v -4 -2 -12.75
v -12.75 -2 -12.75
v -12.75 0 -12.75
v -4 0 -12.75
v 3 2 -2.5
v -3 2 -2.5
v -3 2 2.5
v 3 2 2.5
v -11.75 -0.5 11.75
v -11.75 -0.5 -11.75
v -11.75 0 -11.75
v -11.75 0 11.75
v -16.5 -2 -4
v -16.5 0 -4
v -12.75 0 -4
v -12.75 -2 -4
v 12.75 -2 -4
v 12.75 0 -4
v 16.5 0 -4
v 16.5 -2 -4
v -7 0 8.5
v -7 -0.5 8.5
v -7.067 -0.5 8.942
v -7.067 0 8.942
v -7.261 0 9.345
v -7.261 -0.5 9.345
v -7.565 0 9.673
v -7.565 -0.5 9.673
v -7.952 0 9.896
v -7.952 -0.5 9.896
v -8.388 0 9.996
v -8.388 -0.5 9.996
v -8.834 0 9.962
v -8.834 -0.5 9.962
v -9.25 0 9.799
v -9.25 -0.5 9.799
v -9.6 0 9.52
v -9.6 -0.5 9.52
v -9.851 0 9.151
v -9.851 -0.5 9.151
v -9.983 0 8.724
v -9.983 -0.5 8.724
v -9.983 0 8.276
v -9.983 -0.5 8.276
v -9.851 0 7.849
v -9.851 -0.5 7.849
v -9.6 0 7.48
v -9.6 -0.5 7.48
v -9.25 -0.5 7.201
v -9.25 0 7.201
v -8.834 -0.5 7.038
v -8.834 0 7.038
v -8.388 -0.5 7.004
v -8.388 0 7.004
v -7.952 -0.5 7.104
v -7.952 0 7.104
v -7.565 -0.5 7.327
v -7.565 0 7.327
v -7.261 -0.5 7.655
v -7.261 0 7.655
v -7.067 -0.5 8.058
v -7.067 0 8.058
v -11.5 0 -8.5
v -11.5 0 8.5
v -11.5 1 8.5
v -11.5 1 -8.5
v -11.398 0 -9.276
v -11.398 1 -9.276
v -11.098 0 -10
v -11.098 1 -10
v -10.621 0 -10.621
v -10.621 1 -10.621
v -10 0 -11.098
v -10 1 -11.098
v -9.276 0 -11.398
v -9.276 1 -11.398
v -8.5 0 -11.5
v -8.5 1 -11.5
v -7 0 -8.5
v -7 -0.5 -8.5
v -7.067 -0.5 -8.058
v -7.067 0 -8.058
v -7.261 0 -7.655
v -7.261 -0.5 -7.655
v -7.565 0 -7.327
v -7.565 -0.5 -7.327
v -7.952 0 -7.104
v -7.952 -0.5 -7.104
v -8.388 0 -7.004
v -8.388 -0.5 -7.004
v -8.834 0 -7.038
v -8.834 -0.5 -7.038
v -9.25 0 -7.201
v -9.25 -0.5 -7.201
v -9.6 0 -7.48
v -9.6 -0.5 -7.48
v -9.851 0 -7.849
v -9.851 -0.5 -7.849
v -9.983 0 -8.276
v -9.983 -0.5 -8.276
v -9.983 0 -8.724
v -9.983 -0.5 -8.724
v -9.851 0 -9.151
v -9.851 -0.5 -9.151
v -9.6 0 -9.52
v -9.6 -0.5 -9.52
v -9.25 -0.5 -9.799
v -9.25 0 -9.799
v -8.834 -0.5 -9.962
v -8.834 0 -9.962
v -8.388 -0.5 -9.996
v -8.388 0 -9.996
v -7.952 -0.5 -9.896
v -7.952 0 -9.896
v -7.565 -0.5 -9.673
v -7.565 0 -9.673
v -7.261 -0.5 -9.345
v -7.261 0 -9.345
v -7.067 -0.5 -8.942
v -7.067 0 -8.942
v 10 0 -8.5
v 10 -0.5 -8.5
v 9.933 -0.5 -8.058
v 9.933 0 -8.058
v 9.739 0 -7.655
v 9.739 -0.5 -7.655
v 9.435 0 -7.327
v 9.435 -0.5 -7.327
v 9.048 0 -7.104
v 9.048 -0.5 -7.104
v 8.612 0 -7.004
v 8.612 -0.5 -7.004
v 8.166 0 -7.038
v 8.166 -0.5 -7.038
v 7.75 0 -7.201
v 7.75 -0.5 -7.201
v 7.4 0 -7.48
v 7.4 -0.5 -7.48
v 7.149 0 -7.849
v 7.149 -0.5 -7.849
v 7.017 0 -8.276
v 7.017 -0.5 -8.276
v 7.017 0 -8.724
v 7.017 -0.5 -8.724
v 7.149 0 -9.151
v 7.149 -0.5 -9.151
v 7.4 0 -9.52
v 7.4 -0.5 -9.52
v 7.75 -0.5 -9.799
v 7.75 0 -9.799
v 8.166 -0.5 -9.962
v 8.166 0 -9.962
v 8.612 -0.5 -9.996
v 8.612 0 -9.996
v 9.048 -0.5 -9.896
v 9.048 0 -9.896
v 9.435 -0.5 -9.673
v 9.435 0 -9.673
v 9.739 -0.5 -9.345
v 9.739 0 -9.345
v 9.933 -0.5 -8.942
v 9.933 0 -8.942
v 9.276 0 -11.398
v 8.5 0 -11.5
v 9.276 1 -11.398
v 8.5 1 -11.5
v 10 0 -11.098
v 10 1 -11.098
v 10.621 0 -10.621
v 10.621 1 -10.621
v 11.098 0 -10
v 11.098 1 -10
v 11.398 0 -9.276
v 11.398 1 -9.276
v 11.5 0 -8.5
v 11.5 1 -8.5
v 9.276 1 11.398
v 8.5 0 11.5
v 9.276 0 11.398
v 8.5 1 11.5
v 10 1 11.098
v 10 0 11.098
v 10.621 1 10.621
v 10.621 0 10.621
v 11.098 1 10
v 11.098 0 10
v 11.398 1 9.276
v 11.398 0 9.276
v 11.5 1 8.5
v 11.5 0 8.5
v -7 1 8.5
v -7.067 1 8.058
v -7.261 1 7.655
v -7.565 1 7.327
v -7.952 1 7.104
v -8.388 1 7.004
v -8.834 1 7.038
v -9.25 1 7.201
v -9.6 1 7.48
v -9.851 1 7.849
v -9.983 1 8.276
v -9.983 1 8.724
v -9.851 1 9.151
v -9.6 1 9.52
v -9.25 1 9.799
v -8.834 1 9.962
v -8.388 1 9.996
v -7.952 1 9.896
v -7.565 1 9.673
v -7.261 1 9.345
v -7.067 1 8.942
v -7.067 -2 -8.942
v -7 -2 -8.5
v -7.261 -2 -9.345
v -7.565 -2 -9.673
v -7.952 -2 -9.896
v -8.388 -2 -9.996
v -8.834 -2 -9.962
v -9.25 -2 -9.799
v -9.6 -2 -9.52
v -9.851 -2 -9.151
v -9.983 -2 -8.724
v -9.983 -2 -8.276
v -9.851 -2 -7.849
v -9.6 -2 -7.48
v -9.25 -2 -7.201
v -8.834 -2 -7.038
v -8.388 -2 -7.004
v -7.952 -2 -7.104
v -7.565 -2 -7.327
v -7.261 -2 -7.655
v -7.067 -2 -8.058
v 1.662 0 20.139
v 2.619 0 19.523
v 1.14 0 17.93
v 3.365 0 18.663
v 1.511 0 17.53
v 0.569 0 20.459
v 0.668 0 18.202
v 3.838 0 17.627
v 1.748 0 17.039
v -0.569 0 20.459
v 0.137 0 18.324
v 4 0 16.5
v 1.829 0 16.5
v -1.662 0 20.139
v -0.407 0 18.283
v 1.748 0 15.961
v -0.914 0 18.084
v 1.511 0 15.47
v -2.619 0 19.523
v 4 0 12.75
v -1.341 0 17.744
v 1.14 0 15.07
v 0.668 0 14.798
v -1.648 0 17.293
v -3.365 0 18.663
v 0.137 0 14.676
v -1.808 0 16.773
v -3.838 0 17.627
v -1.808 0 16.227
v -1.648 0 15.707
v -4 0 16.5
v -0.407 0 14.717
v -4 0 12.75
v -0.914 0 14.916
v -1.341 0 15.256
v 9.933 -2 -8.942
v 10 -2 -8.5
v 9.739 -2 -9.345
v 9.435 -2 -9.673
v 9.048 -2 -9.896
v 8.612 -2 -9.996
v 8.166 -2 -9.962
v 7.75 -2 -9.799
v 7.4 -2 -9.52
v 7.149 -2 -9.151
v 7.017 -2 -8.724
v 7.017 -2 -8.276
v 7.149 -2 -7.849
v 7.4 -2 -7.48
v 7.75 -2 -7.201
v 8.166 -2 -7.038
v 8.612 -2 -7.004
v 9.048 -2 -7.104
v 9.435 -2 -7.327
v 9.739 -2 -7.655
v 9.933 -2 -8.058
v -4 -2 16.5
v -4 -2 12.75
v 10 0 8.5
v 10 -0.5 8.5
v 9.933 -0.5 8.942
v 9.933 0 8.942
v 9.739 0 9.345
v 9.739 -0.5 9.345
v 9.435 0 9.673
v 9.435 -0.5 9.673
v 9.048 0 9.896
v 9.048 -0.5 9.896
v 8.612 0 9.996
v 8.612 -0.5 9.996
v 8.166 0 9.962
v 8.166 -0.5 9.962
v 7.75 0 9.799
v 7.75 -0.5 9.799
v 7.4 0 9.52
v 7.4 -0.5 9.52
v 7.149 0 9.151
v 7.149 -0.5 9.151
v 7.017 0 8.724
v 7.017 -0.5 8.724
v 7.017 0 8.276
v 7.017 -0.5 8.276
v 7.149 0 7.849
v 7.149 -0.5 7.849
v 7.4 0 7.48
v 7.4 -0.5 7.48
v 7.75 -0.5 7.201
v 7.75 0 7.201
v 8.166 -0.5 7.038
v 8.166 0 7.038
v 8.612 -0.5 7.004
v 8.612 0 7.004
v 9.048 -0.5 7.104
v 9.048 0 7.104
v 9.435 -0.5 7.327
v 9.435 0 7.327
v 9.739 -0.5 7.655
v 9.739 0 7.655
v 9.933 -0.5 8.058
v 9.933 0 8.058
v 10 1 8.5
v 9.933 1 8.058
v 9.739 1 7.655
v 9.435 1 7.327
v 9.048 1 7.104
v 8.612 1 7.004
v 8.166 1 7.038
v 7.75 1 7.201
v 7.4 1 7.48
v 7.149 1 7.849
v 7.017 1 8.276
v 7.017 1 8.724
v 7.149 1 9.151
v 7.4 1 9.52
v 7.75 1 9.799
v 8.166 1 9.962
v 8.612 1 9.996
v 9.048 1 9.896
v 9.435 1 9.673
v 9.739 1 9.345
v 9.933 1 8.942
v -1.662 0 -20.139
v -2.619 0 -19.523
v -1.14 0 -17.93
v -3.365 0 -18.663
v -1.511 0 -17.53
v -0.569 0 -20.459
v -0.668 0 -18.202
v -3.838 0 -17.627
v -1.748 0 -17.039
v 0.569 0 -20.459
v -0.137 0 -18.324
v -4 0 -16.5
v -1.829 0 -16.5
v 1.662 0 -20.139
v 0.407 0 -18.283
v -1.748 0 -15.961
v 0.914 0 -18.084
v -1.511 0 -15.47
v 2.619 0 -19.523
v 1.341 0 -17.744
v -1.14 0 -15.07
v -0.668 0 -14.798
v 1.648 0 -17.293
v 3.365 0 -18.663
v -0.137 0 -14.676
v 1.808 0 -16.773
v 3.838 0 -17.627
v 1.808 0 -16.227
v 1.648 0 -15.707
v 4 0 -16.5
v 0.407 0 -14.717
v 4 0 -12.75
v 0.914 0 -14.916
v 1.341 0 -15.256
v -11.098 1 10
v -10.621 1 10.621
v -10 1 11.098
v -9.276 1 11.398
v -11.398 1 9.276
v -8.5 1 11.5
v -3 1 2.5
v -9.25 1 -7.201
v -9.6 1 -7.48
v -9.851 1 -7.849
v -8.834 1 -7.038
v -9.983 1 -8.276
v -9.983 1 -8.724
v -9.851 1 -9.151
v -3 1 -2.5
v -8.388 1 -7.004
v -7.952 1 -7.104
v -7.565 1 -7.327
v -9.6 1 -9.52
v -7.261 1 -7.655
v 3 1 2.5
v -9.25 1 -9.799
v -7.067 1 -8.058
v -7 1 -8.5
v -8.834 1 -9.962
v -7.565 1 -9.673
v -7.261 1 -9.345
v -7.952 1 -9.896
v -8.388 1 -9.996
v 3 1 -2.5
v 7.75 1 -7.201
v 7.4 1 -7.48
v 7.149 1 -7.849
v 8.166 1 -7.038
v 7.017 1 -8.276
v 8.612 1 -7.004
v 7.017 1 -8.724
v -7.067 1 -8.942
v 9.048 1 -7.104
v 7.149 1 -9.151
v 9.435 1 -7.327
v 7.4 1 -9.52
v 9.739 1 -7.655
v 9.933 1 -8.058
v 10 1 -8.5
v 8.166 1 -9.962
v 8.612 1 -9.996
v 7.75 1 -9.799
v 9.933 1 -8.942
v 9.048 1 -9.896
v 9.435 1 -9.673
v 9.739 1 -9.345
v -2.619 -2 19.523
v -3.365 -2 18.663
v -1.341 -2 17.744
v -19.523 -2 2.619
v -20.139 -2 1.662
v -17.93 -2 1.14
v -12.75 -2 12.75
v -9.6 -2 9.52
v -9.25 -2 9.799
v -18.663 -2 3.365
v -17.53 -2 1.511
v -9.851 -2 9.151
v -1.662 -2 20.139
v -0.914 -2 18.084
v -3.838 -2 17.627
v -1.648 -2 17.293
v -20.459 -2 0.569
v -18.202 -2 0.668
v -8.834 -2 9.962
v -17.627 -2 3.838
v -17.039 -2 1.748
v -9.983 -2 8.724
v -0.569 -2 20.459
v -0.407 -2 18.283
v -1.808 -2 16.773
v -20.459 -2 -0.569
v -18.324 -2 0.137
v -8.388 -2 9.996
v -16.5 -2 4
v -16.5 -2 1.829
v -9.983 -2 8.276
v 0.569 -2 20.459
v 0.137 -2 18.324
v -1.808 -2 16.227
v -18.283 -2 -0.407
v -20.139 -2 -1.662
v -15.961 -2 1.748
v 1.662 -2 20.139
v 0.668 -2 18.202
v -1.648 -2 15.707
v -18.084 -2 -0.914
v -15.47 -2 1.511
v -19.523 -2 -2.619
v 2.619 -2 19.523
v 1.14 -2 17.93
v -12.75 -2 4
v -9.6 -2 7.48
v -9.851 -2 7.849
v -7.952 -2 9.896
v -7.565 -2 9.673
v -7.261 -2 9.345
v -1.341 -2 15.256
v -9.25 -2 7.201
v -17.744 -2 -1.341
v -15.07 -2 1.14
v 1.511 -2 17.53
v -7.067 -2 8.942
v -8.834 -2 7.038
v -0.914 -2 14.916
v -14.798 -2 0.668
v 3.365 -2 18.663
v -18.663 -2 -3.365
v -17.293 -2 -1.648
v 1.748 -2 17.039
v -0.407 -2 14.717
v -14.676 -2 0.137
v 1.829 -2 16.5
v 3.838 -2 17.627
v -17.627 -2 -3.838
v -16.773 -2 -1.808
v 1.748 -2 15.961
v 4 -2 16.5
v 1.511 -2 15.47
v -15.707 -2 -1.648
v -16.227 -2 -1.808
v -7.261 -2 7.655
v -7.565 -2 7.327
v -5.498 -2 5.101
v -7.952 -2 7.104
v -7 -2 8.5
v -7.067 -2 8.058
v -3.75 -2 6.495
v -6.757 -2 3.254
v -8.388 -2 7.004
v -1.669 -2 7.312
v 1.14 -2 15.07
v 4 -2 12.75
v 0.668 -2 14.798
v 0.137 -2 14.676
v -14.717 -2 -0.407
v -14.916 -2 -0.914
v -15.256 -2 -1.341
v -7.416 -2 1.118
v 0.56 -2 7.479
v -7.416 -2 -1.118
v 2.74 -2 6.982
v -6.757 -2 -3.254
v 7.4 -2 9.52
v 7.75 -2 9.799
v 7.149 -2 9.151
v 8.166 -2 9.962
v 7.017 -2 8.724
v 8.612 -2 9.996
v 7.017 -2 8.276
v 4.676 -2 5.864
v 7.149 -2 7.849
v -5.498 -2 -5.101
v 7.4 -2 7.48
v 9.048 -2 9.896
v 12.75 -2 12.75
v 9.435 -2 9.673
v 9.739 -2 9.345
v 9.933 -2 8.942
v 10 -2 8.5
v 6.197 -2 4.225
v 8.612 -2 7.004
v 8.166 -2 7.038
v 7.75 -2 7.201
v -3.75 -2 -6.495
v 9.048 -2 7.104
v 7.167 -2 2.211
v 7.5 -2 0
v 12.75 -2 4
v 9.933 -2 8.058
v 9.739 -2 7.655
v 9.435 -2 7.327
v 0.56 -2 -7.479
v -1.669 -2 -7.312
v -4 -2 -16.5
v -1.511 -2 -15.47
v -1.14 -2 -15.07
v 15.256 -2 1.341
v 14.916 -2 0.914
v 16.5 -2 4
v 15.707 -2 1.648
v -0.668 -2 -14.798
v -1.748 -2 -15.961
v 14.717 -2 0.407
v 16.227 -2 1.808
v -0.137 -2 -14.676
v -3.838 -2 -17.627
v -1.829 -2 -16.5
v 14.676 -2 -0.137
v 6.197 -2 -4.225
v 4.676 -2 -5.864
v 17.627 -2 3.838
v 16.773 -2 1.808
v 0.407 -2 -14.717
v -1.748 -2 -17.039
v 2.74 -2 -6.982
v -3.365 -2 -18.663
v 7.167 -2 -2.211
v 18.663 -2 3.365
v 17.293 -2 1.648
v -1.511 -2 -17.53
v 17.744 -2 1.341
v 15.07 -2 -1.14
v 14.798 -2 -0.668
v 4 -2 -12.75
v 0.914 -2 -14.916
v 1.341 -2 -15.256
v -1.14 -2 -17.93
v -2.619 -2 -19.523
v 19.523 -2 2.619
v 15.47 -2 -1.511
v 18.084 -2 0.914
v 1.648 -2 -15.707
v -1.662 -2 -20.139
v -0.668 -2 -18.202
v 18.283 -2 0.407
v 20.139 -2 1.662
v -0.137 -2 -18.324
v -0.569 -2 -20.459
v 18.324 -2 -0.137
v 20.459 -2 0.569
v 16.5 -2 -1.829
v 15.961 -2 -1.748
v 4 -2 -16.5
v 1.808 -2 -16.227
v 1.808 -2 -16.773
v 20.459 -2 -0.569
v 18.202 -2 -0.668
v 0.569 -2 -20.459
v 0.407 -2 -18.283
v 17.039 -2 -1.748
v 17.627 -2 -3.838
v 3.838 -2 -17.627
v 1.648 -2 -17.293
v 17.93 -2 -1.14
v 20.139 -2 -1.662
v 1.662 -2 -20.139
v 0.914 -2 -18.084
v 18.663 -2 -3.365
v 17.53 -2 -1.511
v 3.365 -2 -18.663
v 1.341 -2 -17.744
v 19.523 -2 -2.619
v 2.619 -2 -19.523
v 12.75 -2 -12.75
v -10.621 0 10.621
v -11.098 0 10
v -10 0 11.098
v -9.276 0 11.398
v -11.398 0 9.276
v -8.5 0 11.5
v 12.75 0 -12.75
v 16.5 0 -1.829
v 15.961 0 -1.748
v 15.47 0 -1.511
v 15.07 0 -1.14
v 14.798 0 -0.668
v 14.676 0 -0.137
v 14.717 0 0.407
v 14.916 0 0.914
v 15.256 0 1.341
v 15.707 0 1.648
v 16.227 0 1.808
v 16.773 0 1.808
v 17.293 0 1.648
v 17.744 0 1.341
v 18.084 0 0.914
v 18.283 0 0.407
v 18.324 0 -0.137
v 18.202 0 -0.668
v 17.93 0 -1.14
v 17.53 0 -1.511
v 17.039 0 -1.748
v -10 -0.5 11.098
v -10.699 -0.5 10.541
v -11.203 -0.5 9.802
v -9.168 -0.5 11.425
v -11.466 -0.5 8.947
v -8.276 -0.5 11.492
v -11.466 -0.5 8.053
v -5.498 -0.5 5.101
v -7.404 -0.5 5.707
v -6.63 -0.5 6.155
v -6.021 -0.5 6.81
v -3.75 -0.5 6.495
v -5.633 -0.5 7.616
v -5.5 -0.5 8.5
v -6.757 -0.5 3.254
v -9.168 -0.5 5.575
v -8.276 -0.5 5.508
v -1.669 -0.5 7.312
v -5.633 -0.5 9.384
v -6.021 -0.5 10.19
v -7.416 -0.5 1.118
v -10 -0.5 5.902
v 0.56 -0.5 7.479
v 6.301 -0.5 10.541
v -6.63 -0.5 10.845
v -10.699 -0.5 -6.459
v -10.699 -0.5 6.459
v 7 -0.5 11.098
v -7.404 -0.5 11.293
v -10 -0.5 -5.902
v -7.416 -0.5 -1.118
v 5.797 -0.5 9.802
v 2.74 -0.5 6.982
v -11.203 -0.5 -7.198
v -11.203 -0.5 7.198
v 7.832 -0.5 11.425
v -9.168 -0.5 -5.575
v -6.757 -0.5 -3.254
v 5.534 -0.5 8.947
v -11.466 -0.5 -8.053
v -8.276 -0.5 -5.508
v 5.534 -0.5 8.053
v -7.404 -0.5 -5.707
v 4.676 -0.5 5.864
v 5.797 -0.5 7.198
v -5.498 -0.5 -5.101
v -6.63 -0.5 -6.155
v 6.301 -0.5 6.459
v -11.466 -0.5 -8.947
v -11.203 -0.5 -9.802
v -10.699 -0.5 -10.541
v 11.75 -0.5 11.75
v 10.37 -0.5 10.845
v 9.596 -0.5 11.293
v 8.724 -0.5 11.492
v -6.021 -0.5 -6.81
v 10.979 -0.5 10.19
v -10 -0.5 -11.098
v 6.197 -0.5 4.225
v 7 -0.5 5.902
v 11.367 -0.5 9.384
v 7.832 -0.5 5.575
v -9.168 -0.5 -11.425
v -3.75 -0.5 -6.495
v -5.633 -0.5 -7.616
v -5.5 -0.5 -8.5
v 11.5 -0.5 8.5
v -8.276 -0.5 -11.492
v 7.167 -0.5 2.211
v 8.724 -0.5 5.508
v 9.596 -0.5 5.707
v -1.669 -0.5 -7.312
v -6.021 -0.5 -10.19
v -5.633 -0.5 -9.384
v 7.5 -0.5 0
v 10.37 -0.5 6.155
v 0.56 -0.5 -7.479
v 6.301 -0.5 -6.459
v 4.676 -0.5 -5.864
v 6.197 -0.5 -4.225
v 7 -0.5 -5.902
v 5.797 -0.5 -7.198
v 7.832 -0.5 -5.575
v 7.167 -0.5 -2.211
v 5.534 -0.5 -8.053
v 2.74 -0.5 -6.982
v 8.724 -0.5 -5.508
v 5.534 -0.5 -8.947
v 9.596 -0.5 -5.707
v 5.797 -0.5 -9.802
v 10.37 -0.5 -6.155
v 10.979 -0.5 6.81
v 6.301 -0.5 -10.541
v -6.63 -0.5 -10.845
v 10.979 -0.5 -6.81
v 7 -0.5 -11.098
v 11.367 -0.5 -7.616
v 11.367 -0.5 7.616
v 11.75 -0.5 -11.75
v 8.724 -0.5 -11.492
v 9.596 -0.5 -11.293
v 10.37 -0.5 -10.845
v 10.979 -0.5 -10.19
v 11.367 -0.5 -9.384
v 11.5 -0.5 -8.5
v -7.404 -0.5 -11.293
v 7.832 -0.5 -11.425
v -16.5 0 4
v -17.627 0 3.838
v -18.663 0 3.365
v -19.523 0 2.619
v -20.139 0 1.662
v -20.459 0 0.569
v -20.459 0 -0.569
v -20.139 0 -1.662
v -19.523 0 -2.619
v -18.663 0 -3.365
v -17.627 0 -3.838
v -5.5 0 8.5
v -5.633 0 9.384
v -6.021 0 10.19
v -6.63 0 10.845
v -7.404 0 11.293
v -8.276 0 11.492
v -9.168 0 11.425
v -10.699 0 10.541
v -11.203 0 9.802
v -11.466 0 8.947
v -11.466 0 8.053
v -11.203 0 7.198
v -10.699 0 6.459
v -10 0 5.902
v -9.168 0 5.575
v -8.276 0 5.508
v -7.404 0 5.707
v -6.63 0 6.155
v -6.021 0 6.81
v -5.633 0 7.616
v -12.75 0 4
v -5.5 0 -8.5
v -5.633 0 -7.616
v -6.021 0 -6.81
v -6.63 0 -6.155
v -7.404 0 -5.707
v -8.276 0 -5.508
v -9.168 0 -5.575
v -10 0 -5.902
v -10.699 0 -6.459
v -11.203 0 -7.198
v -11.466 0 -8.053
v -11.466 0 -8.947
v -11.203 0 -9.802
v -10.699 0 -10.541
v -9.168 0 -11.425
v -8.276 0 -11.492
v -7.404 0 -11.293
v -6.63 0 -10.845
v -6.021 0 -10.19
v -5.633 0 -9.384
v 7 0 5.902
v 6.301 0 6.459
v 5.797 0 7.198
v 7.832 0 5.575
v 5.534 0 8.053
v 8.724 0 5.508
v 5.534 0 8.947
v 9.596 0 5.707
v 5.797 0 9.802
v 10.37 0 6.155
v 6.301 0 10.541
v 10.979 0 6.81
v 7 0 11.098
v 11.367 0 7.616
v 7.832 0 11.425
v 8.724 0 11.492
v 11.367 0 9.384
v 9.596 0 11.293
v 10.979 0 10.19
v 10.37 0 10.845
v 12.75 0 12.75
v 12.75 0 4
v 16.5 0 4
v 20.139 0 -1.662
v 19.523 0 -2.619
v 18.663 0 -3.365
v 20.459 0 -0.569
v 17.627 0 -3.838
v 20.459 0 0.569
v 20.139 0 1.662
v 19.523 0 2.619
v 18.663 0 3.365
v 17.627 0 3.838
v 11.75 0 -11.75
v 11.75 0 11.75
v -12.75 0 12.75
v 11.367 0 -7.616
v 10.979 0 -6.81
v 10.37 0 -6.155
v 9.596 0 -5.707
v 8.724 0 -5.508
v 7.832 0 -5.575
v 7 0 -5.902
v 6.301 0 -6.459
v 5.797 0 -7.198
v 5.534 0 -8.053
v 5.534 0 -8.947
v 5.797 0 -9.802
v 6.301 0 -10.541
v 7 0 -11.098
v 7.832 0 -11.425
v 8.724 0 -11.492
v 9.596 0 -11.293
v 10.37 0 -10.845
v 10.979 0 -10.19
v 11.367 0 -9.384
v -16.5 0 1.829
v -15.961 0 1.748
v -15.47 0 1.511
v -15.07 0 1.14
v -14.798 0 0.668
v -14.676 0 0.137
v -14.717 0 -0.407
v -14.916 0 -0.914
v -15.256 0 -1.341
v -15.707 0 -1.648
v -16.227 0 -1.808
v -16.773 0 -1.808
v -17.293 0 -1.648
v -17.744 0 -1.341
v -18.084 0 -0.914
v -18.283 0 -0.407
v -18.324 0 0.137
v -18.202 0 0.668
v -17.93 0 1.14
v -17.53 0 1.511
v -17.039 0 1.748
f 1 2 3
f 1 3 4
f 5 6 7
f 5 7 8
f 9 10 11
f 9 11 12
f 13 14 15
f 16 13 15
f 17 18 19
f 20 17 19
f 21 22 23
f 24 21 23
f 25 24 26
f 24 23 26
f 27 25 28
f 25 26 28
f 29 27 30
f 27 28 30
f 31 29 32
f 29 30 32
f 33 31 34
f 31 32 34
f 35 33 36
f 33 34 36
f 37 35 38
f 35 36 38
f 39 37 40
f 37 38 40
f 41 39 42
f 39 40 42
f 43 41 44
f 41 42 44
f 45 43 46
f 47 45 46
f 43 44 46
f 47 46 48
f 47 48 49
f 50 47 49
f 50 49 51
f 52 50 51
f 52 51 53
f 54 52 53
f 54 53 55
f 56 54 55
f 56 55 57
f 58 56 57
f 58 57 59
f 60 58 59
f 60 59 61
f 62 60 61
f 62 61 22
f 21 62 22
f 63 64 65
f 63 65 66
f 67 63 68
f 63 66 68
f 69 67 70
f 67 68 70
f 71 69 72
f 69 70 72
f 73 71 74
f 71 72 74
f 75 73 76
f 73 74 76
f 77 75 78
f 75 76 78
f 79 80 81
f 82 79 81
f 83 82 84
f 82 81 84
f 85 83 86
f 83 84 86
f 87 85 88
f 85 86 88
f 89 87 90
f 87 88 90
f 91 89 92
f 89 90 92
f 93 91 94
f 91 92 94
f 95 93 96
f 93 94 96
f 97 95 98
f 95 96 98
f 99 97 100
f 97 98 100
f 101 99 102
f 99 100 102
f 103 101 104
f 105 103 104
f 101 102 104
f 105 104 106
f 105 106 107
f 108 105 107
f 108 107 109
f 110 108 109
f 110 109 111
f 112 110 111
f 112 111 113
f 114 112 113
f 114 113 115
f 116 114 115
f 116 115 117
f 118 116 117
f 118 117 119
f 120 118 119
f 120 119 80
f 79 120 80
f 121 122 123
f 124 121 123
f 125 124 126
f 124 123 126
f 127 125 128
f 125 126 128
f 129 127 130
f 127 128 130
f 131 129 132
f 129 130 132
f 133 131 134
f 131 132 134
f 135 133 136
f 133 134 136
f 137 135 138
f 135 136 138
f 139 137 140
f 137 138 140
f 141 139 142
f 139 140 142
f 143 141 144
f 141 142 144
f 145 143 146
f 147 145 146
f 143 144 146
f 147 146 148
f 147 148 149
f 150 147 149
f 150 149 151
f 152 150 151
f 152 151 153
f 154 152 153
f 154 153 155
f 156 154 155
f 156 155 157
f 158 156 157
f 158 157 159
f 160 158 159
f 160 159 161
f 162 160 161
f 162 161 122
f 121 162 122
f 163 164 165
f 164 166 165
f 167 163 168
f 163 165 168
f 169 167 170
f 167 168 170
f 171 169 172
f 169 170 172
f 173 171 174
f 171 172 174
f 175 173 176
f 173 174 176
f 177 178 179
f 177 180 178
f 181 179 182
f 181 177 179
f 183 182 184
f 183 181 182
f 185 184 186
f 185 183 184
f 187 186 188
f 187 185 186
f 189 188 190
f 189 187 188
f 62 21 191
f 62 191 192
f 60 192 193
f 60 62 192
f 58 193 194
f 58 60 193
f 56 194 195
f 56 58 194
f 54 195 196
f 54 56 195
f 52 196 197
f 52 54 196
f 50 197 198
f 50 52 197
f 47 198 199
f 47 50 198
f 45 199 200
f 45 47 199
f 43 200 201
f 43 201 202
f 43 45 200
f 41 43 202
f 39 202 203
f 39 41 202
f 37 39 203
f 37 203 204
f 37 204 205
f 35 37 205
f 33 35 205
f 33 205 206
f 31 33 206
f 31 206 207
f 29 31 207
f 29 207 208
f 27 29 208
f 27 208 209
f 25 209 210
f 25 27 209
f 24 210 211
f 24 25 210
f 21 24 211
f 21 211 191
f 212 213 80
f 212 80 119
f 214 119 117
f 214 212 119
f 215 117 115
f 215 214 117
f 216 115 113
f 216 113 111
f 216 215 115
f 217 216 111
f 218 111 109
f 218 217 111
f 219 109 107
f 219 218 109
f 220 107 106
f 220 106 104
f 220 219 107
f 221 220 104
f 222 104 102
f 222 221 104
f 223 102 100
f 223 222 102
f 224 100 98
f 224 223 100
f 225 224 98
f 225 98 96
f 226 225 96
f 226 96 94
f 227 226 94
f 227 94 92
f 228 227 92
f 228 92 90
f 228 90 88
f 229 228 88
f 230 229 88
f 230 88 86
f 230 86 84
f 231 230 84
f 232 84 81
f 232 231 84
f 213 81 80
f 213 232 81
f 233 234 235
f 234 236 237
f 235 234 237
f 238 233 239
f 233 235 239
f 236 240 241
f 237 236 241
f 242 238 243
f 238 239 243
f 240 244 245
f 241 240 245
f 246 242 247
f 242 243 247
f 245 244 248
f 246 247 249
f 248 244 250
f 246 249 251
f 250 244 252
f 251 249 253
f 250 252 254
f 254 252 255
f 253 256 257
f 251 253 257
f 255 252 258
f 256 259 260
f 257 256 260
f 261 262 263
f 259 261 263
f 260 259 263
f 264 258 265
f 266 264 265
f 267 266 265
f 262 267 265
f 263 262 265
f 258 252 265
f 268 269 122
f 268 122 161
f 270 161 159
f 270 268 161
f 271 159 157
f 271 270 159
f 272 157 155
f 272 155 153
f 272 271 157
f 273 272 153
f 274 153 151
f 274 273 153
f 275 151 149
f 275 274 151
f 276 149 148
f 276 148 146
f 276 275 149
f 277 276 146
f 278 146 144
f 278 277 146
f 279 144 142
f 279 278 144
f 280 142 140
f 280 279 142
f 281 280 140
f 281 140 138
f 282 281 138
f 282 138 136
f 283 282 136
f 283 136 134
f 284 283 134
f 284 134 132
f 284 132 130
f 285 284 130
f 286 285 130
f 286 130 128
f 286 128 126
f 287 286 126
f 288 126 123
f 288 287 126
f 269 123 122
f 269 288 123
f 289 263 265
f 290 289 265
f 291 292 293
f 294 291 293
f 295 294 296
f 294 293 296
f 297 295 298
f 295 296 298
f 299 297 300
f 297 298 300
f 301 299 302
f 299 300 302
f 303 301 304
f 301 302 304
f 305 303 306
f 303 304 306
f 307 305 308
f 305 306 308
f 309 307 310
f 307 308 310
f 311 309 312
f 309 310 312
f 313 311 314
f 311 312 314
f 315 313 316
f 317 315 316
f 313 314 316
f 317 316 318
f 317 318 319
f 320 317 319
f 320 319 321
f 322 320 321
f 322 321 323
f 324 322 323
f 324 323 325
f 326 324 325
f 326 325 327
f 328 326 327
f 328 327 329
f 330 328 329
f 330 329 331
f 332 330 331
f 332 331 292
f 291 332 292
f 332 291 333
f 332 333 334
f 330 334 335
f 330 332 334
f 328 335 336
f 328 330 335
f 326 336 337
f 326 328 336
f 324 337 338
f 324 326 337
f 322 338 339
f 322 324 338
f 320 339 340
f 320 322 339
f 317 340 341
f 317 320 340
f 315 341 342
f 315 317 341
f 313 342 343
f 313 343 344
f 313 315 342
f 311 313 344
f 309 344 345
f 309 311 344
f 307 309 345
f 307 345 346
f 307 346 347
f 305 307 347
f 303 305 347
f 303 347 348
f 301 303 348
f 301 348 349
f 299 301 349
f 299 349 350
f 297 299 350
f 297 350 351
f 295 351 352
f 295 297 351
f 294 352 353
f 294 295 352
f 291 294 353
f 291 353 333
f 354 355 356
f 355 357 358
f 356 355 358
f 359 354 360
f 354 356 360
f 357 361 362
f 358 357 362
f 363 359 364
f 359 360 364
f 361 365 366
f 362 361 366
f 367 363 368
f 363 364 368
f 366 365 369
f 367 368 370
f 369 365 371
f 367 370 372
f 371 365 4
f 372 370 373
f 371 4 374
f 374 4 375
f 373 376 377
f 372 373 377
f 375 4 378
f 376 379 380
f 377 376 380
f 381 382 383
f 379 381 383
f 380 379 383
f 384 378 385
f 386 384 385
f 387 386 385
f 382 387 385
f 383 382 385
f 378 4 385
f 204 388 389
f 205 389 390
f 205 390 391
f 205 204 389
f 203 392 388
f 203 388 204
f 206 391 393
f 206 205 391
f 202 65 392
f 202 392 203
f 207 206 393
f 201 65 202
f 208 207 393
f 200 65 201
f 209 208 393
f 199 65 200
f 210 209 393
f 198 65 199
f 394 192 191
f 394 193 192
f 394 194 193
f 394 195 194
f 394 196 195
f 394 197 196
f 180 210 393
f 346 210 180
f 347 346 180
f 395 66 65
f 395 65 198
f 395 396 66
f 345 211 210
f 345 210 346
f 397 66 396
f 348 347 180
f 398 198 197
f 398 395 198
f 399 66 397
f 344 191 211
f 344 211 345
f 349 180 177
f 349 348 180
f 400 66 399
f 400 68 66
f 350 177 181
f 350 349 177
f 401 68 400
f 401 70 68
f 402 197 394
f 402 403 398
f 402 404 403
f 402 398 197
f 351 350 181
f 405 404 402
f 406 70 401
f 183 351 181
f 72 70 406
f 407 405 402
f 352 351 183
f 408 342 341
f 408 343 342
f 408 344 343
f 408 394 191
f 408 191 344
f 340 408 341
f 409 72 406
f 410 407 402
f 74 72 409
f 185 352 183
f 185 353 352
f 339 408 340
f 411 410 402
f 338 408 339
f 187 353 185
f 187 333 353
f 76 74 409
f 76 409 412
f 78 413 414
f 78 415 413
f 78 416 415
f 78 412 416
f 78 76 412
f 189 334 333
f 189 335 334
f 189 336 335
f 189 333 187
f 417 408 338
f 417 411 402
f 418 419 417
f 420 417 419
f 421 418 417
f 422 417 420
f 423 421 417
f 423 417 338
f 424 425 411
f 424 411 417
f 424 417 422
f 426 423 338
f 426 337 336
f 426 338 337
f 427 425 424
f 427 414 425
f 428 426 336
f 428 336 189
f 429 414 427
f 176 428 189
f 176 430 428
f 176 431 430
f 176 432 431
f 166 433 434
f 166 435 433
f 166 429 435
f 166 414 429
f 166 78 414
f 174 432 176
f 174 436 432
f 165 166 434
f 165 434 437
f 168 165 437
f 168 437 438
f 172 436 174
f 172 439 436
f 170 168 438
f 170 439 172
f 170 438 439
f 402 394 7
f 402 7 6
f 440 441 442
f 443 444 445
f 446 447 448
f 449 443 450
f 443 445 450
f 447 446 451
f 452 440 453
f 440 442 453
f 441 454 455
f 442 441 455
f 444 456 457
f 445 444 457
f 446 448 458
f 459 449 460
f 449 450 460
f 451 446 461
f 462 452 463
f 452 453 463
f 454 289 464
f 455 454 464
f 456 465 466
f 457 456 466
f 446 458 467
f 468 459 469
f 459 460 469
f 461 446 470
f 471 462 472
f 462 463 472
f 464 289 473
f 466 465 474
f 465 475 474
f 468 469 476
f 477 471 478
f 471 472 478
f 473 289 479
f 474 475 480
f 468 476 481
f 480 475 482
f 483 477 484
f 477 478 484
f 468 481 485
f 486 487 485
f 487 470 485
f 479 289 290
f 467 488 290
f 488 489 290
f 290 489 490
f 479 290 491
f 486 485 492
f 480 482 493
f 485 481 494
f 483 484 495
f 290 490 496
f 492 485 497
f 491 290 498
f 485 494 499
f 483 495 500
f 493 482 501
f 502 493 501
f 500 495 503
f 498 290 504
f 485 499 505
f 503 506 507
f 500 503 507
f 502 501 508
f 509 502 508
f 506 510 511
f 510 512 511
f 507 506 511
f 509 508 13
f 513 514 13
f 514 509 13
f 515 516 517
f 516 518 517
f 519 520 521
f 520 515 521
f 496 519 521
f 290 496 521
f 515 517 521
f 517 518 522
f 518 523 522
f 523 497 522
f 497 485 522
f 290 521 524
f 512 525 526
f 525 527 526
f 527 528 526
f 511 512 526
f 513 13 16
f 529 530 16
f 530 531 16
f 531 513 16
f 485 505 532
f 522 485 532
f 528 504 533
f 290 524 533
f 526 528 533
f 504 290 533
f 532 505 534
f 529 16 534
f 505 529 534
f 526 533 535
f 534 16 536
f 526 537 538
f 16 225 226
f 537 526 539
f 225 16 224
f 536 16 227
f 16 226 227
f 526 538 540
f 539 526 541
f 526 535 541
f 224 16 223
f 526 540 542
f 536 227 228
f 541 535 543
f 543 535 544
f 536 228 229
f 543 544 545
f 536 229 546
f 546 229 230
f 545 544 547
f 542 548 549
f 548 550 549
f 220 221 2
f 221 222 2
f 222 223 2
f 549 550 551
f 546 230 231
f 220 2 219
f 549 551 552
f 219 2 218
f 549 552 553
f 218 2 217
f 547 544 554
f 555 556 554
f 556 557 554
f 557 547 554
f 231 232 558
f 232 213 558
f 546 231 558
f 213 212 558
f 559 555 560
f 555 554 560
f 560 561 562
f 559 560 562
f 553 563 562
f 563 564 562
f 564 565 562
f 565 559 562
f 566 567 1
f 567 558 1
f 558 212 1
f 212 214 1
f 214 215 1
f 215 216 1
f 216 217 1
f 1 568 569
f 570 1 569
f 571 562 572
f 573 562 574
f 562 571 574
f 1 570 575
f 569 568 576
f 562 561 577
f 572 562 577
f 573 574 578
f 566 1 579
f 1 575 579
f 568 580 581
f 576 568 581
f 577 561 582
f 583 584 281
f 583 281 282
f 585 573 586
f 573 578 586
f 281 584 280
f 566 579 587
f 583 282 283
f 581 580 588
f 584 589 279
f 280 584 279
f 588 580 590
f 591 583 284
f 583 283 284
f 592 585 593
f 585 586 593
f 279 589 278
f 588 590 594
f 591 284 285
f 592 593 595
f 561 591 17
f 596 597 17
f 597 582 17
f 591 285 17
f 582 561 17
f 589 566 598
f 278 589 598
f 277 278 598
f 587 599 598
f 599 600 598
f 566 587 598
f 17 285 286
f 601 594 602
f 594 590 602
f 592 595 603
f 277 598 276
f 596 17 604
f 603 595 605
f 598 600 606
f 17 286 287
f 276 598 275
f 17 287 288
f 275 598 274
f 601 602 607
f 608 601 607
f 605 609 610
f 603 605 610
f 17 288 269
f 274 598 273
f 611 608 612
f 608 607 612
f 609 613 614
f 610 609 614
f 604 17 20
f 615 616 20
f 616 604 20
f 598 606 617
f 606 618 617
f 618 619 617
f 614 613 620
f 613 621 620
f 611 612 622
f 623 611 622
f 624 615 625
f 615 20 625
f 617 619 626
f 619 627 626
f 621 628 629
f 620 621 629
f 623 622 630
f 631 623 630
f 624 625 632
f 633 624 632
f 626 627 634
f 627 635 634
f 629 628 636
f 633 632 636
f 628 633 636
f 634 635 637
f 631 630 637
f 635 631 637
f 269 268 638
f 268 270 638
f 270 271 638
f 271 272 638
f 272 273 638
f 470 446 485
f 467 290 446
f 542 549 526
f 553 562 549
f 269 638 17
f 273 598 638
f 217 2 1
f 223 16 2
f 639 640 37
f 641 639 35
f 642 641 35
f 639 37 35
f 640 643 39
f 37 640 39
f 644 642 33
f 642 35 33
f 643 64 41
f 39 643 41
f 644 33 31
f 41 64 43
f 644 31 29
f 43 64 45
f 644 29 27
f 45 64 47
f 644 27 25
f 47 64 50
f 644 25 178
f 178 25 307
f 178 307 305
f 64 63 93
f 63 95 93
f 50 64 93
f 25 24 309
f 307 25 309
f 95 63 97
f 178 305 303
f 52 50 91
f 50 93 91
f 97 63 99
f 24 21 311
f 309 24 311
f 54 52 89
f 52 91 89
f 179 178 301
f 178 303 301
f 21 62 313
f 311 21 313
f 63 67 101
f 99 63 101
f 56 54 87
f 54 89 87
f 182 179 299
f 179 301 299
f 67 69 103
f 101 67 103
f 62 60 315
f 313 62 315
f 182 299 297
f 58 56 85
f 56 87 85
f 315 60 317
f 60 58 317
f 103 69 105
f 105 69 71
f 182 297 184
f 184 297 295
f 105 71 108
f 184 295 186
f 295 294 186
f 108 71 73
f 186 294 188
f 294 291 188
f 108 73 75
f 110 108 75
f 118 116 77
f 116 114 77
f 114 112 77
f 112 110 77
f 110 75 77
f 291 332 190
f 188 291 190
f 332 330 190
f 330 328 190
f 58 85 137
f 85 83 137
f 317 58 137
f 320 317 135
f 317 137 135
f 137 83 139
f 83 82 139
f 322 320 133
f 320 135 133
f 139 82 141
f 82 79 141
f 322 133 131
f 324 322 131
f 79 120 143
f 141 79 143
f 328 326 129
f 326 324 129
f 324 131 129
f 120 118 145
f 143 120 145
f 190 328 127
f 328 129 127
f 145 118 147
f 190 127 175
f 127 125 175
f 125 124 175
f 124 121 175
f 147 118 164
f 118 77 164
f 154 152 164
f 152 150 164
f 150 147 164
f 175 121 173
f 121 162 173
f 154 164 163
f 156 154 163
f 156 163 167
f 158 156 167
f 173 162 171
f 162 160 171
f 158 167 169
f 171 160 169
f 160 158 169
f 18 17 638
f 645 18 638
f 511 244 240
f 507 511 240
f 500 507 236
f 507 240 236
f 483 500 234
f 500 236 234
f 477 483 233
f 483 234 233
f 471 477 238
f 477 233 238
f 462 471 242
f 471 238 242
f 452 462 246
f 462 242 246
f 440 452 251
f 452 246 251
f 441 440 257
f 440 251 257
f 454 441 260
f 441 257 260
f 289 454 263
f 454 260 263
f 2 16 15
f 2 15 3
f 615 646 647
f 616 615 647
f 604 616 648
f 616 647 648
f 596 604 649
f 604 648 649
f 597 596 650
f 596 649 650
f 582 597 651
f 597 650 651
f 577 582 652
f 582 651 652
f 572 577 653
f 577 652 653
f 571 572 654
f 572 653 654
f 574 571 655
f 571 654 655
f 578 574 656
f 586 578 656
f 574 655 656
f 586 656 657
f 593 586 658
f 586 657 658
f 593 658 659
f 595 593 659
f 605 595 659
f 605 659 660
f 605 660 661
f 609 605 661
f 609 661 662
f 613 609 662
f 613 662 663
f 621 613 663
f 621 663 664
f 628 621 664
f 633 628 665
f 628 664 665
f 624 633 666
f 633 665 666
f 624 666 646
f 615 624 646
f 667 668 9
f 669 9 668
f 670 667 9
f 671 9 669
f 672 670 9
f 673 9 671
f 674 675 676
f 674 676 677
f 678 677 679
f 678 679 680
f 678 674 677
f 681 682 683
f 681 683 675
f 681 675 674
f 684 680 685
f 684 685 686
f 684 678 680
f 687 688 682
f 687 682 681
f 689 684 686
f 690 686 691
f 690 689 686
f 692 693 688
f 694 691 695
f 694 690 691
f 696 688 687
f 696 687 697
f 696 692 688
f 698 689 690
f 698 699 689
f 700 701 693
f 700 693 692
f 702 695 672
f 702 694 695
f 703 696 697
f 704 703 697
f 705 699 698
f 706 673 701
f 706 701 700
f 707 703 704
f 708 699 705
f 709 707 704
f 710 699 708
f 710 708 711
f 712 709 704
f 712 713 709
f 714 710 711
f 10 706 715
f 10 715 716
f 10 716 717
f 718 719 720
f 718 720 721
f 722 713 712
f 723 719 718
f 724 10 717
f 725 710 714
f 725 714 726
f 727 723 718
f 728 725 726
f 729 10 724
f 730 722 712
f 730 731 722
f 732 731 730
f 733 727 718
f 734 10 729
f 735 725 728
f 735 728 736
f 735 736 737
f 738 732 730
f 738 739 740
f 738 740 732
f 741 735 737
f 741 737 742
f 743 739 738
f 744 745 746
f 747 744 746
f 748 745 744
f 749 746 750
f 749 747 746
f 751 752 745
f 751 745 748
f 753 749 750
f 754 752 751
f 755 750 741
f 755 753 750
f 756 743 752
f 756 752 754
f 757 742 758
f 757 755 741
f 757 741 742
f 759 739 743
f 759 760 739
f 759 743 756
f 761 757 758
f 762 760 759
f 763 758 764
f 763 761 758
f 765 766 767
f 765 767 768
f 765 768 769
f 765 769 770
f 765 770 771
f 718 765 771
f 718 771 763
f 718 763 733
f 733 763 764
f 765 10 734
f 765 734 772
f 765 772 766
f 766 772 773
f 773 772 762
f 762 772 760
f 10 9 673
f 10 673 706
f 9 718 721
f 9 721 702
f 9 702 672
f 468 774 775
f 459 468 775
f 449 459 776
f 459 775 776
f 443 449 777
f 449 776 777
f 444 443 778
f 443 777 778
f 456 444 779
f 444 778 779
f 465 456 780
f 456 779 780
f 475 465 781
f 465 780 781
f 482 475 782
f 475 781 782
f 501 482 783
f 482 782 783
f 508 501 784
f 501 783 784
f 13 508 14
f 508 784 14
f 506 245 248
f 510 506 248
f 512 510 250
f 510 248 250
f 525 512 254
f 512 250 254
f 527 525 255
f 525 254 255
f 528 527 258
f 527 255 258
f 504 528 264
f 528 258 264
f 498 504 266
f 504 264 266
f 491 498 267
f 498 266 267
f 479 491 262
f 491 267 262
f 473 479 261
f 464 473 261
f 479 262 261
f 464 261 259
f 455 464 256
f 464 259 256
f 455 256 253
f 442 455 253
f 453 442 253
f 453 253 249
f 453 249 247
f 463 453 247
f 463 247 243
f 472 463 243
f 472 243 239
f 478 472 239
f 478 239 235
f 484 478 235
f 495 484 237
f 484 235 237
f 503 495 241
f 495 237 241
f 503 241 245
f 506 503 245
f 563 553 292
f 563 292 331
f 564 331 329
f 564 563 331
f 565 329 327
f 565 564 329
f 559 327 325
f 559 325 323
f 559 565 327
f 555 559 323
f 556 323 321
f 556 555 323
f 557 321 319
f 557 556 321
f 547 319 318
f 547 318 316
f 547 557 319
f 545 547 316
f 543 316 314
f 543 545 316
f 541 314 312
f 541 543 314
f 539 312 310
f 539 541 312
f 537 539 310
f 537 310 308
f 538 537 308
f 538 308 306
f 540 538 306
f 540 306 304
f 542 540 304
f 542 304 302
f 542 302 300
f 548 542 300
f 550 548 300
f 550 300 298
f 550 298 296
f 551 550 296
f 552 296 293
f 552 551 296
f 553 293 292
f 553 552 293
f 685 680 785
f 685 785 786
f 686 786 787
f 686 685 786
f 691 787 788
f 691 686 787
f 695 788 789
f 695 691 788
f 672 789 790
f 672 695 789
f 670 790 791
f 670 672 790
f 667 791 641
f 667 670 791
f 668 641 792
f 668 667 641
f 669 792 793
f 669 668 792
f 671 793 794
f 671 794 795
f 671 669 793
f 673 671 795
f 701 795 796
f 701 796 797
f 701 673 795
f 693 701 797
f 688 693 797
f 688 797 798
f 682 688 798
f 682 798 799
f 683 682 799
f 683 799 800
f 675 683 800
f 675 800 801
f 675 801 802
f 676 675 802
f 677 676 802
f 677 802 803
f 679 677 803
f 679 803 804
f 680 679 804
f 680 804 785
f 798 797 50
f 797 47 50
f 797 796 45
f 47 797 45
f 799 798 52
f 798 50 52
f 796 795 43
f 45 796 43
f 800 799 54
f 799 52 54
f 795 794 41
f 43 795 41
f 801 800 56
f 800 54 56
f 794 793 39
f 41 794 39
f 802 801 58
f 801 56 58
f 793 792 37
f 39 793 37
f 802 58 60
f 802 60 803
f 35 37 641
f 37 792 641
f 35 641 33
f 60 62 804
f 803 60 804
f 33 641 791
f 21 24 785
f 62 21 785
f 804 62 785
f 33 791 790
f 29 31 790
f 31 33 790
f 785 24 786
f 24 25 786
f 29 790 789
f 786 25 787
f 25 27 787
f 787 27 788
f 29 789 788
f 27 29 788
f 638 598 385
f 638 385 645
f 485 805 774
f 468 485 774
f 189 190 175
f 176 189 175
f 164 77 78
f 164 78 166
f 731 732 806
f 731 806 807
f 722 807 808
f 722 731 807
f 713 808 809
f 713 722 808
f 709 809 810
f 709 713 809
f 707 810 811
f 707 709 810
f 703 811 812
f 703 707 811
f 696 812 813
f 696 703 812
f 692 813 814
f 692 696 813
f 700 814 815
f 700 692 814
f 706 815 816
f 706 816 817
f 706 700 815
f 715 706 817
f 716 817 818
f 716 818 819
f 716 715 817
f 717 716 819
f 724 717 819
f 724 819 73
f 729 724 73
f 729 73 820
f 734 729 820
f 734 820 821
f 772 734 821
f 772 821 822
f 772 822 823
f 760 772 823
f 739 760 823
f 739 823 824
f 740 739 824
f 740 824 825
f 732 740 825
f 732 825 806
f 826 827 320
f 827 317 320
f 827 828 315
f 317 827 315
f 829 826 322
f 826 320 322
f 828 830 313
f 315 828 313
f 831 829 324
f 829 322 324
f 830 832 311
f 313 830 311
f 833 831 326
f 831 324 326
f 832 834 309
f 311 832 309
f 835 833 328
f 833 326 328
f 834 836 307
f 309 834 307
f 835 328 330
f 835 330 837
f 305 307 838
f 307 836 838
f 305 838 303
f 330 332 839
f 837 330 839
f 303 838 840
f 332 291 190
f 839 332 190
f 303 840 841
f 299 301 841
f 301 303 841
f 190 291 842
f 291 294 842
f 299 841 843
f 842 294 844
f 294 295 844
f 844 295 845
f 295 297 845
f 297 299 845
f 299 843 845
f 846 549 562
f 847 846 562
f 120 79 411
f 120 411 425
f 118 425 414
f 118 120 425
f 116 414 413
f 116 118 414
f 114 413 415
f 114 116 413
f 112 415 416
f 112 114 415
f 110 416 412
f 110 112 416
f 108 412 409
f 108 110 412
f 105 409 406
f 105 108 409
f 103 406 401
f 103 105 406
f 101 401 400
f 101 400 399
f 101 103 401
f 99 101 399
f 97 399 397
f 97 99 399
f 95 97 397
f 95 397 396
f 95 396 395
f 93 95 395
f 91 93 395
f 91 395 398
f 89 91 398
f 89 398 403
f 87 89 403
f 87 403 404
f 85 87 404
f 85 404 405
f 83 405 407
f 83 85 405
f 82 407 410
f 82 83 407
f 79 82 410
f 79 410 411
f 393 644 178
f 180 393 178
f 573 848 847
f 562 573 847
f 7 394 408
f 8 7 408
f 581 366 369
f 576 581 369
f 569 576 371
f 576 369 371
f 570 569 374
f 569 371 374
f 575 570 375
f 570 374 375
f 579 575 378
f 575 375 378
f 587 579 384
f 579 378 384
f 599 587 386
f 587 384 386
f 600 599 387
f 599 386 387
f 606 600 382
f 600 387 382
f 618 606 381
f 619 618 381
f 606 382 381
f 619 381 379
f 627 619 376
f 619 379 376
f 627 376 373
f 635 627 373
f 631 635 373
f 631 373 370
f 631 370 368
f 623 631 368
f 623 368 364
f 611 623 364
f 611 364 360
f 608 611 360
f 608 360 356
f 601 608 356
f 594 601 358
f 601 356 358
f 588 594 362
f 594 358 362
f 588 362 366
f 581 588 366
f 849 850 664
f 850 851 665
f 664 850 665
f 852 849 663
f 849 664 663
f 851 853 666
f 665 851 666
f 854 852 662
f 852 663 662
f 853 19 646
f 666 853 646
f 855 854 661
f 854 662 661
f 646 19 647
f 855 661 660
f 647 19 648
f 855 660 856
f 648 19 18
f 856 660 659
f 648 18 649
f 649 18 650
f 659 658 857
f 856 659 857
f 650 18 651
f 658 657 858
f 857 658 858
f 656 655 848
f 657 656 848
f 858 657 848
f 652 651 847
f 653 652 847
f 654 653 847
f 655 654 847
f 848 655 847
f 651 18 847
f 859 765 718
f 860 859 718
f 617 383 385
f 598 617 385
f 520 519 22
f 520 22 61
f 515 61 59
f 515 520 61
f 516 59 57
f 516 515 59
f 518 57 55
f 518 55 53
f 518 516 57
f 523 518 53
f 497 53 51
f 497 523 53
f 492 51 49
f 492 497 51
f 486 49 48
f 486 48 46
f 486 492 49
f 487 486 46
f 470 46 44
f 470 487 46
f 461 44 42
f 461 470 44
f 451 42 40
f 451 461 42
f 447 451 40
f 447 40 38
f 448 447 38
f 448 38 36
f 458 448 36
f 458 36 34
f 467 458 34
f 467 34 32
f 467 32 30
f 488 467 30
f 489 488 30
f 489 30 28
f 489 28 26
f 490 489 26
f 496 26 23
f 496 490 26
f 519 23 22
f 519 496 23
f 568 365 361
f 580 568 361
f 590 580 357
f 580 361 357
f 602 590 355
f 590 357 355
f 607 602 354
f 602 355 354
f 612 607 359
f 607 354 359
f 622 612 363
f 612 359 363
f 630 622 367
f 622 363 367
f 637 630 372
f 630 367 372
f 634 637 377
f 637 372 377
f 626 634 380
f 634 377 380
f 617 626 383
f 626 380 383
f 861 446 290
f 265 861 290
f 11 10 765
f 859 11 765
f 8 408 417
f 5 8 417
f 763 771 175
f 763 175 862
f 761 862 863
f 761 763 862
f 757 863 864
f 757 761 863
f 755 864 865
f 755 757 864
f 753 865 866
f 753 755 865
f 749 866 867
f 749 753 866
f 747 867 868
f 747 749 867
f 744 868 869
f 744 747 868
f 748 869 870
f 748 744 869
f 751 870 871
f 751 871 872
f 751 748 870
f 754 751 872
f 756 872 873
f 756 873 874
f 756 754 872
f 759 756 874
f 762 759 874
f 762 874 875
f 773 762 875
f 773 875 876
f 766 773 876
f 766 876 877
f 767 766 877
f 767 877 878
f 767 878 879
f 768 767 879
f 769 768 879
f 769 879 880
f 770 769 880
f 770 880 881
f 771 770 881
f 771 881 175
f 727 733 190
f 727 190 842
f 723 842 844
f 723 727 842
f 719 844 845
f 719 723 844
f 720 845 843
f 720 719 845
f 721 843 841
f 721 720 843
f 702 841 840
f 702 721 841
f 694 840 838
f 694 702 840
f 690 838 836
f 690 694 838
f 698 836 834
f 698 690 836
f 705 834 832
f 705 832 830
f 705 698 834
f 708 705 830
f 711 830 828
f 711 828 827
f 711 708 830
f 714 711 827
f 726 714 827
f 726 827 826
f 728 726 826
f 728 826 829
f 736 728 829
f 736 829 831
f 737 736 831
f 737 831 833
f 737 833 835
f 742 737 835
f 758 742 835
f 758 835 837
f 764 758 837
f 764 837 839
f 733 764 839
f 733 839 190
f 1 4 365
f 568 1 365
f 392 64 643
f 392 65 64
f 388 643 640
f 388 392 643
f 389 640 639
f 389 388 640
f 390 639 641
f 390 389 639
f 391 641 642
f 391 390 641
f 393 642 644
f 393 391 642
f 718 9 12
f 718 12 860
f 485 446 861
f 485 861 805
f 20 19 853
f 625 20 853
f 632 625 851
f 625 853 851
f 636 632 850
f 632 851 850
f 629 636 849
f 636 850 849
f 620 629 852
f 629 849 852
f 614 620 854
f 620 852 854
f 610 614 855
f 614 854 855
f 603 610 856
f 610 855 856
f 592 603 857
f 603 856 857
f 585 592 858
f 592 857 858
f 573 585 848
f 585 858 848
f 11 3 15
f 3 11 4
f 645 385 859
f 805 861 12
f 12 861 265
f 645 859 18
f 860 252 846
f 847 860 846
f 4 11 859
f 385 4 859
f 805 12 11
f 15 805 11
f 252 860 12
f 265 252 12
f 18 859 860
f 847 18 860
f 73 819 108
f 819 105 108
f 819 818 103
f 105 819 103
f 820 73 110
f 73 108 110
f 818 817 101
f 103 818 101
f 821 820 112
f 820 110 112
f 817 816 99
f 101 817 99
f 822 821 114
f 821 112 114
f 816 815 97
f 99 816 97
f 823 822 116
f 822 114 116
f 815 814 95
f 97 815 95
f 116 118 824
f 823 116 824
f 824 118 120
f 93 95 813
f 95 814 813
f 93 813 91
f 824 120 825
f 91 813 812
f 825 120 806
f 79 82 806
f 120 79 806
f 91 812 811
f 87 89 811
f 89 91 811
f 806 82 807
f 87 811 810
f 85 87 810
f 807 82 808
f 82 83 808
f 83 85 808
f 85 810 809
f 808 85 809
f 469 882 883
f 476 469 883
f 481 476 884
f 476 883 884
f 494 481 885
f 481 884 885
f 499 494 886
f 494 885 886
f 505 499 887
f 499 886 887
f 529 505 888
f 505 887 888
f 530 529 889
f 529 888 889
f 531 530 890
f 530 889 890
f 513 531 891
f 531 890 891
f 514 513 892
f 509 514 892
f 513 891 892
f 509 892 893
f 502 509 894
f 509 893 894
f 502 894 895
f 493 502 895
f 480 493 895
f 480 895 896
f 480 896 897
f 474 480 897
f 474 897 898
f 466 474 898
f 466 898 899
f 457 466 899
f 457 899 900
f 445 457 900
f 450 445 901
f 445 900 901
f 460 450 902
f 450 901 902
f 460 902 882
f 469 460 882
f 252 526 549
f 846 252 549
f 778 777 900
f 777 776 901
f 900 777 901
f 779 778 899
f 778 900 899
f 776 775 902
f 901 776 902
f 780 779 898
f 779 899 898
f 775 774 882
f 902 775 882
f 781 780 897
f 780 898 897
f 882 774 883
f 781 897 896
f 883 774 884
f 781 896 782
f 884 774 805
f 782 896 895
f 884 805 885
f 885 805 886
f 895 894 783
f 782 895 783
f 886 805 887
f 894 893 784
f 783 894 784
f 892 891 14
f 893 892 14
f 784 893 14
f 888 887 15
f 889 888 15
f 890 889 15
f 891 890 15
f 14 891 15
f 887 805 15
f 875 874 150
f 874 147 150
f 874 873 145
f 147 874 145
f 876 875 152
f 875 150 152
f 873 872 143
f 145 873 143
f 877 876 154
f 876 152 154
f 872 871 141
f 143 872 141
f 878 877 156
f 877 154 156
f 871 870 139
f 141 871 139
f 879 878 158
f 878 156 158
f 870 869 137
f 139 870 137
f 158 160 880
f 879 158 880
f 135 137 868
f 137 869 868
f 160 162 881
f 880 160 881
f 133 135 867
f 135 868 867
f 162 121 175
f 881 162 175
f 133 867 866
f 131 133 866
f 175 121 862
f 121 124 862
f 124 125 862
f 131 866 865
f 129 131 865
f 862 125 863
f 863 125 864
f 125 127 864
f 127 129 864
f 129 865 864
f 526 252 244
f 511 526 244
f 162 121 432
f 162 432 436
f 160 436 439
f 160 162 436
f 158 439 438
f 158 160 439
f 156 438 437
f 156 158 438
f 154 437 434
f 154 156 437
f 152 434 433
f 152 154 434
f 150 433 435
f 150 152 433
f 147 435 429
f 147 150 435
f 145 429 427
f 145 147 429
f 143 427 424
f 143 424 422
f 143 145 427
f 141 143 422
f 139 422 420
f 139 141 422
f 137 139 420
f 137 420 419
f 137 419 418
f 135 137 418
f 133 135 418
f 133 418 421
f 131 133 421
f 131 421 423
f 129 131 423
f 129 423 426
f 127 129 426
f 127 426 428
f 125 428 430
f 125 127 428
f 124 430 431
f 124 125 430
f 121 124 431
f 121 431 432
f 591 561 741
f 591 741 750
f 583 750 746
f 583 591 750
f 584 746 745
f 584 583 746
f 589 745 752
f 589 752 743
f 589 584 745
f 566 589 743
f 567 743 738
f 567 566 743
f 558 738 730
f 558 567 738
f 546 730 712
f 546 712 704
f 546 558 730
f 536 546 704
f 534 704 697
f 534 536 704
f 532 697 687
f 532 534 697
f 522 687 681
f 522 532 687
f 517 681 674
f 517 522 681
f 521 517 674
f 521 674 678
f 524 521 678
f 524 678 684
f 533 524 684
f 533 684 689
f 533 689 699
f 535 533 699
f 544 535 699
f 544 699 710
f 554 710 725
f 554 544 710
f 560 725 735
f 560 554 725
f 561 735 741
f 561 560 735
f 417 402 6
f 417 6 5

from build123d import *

# Parameters (mm, degrees)
SKETCH1_W           = 23
SKETCH1_H           = 23
SKETCH1_R           = 1.5
BOSS_EXTRUDE1_DEPTH = 1
SKETCH2_W           = 6
SKETCH2_H           = 5
BOSS_EXTRUDE2_DEPTH = 1
FILLET1_R           = 3
BOSS_EXTRUDE3_START = -3
SKETCH3_W           = 25.5
SKETCH3_H           = 25.5
SKETCH3_R           = 1.5
SKETCH3_R_2         = 7.5
BOSS_EXTRUDE3_DEPTH = 1.5
SKETCH4_R           = 3
SKETCH4_R_2         = 1.5
BOSS_EXTRUDE4_DEPTH = 2
SKETCH5_W           = 25.5
SKETCH5_H           = 25.5
SKETCH5_W_2         = 23.5
SKETCH5_H_2         = 23.5
BOSS_EXTRUDE5_DEPTH = 2
SKETCH6_R           = 1.8288
BOSS_EXTRUDE6_DEPTH = 2
CIRPATTERN1_COUNT   = 4


with BuildPart() as part:
    # Sketch1 → Boss-Extrude1 (new body)
    with BuildSketch(Plane(origin=(0, 0, 0), x_dir=(1, 0, 0), z_dir=(0, 1, 0))):
        Rectangle(SKETCH1_W, SKETCH1_H)
        with Locations((-8.5, 8.5)):
            Circle(SKETCH1_R, mode=Mode.SUBTRACT)
        with Locations((8.5, 8.5)):
            Circle(SKETCH1_R, mode=Mode.SUBTRACT)
        with Locations((8.5, -8.5)):
            Circle(SKETCH1_R, mode=Mode.SUBTRACT)
        with Locations((-8.5, -8.5)):
            Circle(SKETCH1_R, mode=Mode.SUBTRACT)
    extrude(amount=BOSS_EXTRUDE1_DEPTH)

    # Sketch2 → Boss-Extrude2 (add)
    with BuildSketch(Plane(origin=(0, 1, 0), x_dir=(1, 0, 0), z_dir=(0, 1, 0))):
        Rectangle(SKETCH2_W, SKETCH2_H)
    extrude(amount=BOSS_EXTRUDE2_DEPTH)

    # Fillet1
    fillet1_edges = [part.edges().sort_by_distance(p)[0] for p in [
        (11.5, 0.5, 11.5),
        (-11.5, 0.5, 11.5),
        (-11.5, 0.5, -11.5),
        (11.5, 0.5, -11.5),
    ]]
    fillet(fillet1_edges, radius=FILLET1_R)


with BuildPart() as body_2:
    # Sketch3 → Boss-Extrude3 (new body)
    with BuildSketch(Plane(origin=(0, 1, 0), x_dir=(1, 0, 0), z_dir=(0, 1, 0)).offset(BOSS_EXTRUDE3_START)):
        Rectangle(SKETCH3_W, SKETCH3_H)
        with Locations((-8.5, 8.5)):
            Circle(SKETCH3_R, mode=Mode.SUBTRACT)
        with Locations((8.5, 8.5)):
            Circle(SKETCH3_R, mode=Mode.SUBTRACT)
        with Locations((8.5, -8.5)):
            Circle(SKETCH3_R, mode=Mode.SUBTRACT)
        with Locations((-8.5, -8.5)):
            Circle(SKETCH3_R, mode=Mode.SUBTRACT)
        Circle(SKETCH3_R_2, mode=Mode.SUBTRACT)
    extrude(amount=BOSS_EXTRUDE3_DEPTH)

    # Sketch4 → Boss-Extrude4 (add)
    with BuildSketch(Plane.XZ.offset(2)):
        with Locations((-8.5, 8.5)):
            Circle(SKETCH4_R)
        with Locations((-8.5, 8.5)):
            Circle(SKETCH4_R_2, mode=Mode.SUBTRACT)
        with Locations((8.5, 8.5)):
            Circle(SKETCH4_R)
        with Locations((8.5, 8.5)):
            Circle(SKETCH4_R_2, mode=Mode.SUBTRACT)
        with Locations((8.5, -8.5)):
            Circle(SKETCH4_R)
        with Locations((8.5, -8.5)):
            Circle(SKETCH4_R_2, mode=Mode.SUBTRACT)
        with Locations((-8.5, -8.5)):
            Circle(SKETCH4_R)
        with Locations((-8.5, -8.5)):
            Circle(SKETCH4_R_2, mode=Mode.SUBTRACT)
    extrude(amount=-BOSS_EXTRUDE4_DEPTH)

    # Sketch5 → Boss-Extrude5 (add)
    with BuildSketch(Plane.XZ.offset(2)):
        Rectangle(SKETCH5_W, SKETCH5_H)
        Rectangle(SKETCH5_W_2, SKETCH5_H_2, mode=Mode.SUBTRACT)
    extrude(amount=-BOSS_EXTRUDE5_DEPTH)

    # Sketch6 → Boss-Extrude6 (add)
    with BuildSketch(Plane(origin=(0, 0, 0), x_dir=(-1, 0, 0), z_dir=(0, 1, 0))):
        with BuildLine():
            Line((-4, -16.5), (-4, -12.75))
            Line((-4, -12.75), (4, -12.75))
            Line((4, -12.75), (4, -16.5))
            ThreePointArc((4, -16.5), (0, -20.5), (-4, -16.5))
        make_face()
        with Locations((0, -16.5)):
            Circle(SKETCH6_R, mode=Mode.SUBTRACT)
    boss_extrude6 = extrude(amount=-BOSS_EXTRUDE6_DEPTH)

    # CirPattern1: Boss-Extrude6 ×4 about axis
    cirpattern1_axis = Axis((0, 0, 0), (0, 1, 0))
    for i in range(1, CIRPATTERN1_COUNT):
        add(boss_extrude6.rotate(cirpattern1_axis, i * 360 / CIRPATTERN1_COUNT))


solid = Compound([part.part, body_2.part])
